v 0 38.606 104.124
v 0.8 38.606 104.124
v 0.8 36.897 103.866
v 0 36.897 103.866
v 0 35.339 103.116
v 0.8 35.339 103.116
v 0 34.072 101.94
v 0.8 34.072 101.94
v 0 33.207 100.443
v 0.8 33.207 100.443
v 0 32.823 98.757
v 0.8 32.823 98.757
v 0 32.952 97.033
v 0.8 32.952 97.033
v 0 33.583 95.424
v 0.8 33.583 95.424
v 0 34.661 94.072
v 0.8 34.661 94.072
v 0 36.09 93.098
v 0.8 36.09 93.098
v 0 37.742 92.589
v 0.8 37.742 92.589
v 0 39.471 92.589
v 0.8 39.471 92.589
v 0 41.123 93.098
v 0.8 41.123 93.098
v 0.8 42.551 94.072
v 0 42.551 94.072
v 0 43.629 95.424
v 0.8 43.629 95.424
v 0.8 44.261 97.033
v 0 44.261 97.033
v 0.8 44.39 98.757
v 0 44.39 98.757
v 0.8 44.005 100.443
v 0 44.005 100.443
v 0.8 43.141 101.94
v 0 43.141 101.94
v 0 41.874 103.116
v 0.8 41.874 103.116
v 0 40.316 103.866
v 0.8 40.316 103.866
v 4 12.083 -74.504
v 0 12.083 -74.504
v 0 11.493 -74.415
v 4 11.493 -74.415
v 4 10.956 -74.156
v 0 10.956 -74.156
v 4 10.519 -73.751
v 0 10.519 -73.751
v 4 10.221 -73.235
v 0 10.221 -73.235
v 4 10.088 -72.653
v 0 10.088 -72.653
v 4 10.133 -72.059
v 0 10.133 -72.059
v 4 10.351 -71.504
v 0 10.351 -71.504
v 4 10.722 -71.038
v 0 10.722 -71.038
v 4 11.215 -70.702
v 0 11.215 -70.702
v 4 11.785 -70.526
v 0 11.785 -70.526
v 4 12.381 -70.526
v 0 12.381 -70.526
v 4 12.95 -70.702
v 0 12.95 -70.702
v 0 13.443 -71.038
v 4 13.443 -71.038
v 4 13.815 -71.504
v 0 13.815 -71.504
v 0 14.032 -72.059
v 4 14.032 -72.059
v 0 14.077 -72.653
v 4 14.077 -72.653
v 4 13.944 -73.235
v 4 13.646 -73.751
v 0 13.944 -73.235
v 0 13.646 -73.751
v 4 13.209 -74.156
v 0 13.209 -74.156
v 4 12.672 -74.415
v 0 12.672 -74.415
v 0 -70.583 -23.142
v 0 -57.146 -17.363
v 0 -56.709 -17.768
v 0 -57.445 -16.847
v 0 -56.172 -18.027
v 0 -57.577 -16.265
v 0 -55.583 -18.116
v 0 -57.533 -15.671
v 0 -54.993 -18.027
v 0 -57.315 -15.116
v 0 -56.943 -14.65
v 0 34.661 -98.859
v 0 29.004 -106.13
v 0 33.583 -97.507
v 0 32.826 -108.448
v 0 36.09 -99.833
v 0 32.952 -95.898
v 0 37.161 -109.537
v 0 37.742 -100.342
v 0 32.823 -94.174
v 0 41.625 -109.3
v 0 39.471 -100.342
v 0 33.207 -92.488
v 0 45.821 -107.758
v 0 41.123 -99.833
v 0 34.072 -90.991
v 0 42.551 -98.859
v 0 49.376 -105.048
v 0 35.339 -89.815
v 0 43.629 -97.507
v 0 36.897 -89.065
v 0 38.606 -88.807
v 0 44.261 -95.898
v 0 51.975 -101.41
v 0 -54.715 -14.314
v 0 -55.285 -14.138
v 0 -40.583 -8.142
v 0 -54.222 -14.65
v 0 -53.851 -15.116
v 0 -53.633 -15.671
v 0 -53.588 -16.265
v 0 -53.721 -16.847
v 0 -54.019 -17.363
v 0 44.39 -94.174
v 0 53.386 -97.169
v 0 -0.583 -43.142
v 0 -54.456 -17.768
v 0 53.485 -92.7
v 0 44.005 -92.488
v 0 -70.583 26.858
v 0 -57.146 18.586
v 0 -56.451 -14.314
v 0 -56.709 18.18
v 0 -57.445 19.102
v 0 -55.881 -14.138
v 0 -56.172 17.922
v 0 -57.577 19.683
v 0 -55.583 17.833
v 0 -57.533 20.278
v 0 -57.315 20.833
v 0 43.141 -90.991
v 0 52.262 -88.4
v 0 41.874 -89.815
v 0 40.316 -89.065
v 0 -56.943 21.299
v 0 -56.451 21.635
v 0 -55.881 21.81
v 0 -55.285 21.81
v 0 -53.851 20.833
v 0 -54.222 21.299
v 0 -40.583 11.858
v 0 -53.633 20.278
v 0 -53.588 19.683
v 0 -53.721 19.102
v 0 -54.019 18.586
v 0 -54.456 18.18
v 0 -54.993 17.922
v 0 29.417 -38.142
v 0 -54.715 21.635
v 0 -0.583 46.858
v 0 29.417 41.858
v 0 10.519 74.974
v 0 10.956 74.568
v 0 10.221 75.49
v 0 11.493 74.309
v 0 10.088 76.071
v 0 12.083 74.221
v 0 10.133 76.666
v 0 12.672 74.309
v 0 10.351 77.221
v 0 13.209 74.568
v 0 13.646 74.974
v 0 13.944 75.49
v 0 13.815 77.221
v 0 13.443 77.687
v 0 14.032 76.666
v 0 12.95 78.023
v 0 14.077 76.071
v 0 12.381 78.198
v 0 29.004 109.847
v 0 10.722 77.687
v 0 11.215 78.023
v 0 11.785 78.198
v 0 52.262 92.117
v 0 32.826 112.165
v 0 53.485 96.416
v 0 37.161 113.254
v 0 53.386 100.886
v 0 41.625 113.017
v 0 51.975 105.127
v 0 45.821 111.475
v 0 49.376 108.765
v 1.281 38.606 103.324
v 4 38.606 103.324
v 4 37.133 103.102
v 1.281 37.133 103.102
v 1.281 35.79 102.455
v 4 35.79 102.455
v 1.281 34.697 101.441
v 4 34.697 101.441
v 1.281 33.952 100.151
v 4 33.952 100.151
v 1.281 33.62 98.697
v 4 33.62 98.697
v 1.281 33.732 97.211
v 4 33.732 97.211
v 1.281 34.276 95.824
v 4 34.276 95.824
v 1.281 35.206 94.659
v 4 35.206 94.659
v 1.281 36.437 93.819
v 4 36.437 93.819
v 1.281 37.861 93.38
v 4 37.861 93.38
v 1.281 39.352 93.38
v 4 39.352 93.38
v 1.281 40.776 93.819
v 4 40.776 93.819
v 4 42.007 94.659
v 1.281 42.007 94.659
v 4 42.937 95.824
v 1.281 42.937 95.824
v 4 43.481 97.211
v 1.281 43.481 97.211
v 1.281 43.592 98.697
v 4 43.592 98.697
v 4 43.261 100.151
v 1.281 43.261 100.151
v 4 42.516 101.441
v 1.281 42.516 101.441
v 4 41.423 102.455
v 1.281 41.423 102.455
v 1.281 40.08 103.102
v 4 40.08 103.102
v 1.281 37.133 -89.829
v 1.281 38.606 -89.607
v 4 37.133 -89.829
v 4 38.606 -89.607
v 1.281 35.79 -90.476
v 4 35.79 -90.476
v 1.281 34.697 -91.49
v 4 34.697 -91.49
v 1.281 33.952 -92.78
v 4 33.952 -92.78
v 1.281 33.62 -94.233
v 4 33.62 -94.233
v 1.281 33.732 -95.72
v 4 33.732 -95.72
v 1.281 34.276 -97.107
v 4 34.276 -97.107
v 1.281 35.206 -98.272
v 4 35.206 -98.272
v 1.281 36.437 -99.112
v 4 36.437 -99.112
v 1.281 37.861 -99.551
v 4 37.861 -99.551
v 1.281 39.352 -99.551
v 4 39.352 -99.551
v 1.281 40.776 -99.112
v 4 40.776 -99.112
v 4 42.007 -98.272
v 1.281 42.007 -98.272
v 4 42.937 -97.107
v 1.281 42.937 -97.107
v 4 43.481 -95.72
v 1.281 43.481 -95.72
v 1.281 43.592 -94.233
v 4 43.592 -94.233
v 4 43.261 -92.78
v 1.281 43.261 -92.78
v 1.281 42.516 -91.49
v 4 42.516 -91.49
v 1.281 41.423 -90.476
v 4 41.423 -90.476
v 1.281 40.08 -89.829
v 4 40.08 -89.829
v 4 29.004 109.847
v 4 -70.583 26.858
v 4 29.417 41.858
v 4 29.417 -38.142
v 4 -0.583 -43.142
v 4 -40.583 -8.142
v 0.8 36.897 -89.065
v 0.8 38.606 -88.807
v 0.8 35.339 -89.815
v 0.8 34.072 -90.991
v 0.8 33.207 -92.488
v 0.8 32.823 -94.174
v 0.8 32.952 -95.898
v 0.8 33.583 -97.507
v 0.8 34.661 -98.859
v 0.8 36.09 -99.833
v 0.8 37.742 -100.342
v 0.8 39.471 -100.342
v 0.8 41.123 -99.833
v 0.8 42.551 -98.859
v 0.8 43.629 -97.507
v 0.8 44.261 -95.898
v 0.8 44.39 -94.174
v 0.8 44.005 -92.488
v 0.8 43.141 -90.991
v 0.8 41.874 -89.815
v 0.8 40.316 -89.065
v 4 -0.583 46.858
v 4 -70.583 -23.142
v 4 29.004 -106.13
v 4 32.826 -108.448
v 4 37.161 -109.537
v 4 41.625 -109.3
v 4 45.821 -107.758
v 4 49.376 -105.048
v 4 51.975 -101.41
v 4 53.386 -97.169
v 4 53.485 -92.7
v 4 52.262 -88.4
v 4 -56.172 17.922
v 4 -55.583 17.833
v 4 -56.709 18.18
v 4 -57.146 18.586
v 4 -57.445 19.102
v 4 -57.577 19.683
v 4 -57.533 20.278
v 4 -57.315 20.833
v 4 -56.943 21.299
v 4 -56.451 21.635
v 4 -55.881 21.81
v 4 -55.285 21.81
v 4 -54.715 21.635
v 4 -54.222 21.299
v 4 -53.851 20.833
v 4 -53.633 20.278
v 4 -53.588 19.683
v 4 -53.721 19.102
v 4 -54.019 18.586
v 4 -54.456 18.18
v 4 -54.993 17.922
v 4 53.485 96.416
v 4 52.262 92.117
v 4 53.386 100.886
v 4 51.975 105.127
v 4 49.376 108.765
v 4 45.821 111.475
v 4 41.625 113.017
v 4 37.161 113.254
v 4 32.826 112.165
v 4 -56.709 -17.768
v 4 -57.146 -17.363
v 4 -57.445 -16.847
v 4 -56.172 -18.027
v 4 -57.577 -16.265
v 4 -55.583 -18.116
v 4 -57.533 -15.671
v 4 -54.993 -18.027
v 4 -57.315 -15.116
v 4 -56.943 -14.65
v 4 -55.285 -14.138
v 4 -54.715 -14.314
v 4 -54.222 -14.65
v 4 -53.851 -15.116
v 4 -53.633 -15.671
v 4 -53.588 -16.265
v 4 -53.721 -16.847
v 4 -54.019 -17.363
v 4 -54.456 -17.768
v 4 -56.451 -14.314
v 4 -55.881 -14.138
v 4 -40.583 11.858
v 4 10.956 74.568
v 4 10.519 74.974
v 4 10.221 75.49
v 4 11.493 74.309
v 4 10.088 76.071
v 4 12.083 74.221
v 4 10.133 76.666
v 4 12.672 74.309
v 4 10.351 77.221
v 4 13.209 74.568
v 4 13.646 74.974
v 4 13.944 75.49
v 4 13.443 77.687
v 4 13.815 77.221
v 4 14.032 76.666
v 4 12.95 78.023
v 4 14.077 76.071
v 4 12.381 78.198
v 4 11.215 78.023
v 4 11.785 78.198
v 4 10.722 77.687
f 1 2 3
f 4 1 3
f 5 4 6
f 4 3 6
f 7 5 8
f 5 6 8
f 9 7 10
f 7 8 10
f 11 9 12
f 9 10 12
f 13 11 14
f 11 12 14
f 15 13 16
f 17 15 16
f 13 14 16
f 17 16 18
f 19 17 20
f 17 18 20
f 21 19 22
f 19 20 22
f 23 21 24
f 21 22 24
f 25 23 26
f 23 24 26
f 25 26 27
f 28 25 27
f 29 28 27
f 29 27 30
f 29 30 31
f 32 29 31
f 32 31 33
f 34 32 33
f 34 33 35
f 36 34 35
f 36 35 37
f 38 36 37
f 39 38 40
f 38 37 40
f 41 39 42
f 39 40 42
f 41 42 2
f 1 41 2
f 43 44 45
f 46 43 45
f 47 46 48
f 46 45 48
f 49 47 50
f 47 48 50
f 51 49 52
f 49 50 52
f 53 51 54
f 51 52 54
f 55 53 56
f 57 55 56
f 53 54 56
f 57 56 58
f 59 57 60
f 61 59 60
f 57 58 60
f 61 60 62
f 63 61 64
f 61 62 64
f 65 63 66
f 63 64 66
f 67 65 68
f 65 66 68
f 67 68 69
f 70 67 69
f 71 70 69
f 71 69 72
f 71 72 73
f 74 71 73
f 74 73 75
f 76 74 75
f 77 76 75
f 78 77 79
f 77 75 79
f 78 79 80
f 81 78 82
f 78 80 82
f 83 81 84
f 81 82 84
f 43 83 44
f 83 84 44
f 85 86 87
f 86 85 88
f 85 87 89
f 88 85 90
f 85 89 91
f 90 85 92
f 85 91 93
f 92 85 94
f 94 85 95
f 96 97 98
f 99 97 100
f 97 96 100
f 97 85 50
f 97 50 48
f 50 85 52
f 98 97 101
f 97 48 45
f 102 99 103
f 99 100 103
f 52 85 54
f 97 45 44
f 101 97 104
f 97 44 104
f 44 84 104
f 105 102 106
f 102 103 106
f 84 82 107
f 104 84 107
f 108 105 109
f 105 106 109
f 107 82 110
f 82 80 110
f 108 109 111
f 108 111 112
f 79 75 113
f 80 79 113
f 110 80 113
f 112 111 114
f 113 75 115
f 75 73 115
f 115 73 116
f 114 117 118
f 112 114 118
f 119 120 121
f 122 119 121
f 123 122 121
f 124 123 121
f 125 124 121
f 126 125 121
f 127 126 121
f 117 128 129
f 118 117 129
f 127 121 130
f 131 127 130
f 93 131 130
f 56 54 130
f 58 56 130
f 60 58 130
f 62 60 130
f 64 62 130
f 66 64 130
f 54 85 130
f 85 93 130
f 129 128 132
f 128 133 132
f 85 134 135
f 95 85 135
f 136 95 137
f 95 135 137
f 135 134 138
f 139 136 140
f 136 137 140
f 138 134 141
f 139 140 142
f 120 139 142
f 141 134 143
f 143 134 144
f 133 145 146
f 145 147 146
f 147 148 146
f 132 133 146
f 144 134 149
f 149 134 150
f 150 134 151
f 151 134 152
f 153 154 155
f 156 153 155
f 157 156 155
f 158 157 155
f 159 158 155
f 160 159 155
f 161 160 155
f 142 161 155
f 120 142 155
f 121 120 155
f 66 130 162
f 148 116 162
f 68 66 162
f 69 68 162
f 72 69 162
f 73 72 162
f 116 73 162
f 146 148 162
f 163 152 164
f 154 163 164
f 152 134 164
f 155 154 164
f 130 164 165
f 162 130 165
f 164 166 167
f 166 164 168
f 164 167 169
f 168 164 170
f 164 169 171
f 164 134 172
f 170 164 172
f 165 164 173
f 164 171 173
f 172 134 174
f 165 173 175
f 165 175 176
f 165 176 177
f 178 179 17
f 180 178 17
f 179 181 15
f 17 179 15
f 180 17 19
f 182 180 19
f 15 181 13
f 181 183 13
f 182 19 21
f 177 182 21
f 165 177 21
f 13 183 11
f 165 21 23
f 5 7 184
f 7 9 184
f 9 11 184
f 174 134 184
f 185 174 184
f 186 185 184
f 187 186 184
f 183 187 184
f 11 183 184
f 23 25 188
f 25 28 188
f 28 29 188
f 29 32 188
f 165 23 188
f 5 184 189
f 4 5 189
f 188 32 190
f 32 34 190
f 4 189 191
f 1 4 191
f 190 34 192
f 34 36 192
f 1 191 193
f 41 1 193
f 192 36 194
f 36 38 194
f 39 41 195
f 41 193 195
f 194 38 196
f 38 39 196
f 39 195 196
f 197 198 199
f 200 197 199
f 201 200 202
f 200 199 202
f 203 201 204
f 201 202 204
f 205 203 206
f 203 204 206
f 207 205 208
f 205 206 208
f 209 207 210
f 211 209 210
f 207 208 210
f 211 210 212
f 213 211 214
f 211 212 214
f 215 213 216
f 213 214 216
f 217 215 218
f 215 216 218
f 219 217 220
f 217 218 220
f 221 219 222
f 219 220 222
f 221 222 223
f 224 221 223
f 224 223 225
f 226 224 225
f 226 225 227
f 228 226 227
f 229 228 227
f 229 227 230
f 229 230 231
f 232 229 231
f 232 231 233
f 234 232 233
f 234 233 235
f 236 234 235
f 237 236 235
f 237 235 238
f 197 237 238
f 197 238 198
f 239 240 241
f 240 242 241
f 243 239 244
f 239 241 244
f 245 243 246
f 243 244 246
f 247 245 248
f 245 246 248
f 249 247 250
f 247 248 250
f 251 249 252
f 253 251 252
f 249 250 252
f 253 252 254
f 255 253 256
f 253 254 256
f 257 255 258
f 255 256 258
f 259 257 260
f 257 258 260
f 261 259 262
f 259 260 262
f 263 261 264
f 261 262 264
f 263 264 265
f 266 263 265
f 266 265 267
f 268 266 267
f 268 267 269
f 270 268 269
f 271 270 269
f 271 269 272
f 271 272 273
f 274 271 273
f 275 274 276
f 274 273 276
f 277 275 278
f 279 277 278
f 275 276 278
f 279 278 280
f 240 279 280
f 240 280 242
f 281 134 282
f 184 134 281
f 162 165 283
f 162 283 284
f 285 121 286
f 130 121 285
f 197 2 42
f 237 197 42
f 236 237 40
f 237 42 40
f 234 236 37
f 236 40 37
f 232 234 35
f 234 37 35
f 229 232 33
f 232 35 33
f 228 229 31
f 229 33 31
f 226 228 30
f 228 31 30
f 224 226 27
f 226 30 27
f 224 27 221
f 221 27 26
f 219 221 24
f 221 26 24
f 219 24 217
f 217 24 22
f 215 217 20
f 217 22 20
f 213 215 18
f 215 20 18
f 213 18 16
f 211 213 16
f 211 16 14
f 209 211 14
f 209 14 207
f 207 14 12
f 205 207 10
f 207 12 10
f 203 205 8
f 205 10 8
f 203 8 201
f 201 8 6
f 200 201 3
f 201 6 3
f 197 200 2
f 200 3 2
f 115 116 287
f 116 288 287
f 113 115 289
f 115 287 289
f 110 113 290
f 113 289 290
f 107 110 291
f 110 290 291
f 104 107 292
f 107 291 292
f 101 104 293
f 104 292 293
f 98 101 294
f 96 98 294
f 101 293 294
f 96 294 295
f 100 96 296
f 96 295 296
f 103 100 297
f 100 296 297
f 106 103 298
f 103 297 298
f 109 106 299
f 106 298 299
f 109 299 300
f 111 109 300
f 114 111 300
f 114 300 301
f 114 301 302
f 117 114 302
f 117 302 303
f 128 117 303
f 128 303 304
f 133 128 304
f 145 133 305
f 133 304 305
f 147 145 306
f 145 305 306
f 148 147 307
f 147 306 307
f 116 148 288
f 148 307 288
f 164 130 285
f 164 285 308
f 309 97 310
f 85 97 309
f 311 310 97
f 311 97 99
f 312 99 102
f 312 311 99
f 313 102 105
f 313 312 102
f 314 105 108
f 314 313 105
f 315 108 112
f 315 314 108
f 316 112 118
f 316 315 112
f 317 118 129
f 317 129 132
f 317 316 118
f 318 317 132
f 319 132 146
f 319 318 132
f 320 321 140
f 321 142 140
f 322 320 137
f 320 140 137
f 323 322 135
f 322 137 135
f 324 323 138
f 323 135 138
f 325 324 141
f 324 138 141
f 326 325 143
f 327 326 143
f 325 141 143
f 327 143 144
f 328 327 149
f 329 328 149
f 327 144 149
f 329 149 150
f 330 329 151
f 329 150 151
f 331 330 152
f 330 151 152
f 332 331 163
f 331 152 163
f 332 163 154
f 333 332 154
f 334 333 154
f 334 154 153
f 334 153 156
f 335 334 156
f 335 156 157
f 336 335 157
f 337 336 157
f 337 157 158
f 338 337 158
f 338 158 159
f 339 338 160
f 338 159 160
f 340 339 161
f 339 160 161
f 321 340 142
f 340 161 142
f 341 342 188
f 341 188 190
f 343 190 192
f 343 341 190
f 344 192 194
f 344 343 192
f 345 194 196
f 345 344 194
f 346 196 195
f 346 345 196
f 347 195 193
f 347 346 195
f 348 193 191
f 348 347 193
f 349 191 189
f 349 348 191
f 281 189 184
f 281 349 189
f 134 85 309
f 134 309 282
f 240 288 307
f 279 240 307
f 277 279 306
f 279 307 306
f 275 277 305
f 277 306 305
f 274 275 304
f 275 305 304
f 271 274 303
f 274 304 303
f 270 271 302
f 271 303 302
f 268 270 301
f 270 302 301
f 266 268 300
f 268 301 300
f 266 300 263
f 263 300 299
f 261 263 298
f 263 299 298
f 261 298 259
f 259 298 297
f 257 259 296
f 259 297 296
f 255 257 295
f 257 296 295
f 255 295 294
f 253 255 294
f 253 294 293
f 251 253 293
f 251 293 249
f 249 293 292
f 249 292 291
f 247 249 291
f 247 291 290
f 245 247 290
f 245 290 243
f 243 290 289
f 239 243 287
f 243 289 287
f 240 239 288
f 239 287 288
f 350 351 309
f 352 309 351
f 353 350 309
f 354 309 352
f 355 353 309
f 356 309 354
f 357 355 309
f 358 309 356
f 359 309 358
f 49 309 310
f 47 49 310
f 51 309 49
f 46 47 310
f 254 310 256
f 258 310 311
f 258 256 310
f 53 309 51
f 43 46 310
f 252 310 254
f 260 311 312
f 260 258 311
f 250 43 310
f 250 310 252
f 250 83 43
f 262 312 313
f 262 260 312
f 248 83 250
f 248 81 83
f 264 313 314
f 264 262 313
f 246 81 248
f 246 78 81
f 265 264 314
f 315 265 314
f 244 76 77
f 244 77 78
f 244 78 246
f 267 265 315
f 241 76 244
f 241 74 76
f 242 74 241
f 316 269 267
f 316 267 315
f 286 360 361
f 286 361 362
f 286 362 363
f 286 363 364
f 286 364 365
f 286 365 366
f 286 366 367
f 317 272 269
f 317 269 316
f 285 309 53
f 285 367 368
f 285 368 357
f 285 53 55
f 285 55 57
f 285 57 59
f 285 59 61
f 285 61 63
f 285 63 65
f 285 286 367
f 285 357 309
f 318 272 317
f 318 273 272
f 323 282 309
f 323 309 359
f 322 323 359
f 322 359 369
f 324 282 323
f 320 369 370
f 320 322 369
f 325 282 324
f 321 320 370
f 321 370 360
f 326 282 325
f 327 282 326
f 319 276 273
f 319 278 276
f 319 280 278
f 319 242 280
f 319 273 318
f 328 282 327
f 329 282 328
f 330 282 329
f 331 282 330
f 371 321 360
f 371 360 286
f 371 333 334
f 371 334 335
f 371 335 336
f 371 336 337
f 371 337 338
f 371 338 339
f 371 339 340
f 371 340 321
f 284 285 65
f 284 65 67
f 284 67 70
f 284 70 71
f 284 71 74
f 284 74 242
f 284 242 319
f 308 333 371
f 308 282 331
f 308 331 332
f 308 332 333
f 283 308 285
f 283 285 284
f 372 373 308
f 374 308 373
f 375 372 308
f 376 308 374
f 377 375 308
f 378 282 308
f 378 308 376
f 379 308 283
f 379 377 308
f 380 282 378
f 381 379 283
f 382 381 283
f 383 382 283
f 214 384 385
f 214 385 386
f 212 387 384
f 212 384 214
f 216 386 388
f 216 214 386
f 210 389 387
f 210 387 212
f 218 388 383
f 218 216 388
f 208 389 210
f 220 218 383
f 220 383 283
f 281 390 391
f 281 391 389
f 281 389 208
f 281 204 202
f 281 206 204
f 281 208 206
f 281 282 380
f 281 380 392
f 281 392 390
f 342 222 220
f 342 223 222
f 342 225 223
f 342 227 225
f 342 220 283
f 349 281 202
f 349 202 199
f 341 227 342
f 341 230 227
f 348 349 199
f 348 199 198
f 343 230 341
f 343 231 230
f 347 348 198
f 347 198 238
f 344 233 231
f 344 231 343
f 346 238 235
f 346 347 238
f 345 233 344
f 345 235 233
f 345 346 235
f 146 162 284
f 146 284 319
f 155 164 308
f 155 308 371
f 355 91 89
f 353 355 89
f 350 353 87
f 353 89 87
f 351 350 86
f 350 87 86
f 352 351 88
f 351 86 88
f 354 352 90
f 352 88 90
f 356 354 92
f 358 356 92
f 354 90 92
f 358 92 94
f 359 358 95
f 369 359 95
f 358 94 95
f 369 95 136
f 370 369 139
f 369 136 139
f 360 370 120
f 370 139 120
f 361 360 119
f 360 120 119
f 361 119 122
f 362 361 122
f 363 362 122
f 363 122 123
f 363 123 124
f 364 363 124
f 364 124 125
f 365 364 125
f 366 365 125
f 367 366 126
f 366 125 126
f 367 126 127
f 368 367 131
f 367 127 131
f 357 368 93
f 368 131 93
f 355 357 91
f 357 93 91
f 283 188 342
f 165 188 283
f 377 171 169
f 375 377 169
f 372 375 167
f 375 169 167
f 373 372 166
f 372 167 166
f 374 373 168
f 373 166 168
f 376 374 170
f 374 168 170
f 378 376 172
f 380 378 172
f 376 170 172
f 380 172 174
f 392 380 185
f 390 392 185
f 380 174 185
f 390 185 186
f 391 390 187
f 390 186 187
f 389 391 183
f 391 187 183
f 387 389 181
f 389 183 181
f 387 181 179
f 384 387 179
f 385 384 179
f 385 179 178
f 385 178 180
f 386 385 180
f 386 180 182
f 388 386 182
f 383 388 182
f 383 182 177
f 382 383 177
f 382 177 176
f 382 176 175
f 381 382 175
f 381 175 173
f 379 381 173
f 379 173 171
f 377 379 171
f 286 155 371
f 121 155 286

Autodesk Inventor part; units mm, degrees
ref_plane "YZ Plane" through (0, 0, 0) normal (1, 0, 0) x (0, 1, 0)
ref_plane "XZ Plane" through (0, 0, 0) normal (0, 1, 0) x (-1, 0, 0)
ref_plane "XY Plane" through (0, 0, 0) normal (0, 0, 1) x (1, 0, 0)
sketch "Sketch1" plane through (0, 0, 0) normal (1, 0, 0) x (0, 1, 0)
  line L0 (79.4172, -148.1416) -> (-70.5828, -23.1416)
  line L1 (-70.5828, -23.1416) -> (-70.5828, 26.8584)
  line L2 (-70.5828, 26.8584) -> (79.4172, 151.8584)
  line L3 (79.4172, 151.8584) -> (29.4172, 41.8584)
  line L4 (29.4172, 41.8584) -> (29.4172, -38.1416)
  line L5 (29.4172, -38.1416) -> (79.4172, -148.1416)
  line L6 (-0.5828, -43.1416) -> (-0.5828, 46.8584)
  line L7 (-0.5828, 46.8584) -> (-40.5828, 11.8584)
  line L8 (-40.5828, 11.8584) -> (-40.5828, -8.1416)
  line L9 (-40.5828, -8.1416) -> (-0.5828, -43.1416)
  point P0 (0, 0)
  dimension "d0" = 0
  dimension "d2" = 50
  dimension "d6" = 150
  dimension "d7" = 300
  dimension "d9" = 80
  dimension "d104" = 50
  dimension "d105" = 15
  dimension "d106" = 20
  dimension "d107" = 40
  dimension "d108" = 30
  dimension "d109" = 90
extrude "Extrusion2" add sketch "Sketch1" along normal blind 4
fillet "Fillet2" radius 15 2 edges at (2, 79.4172, -148.1416) (2, 79.4172, 151.8584)
hole "Hole11" at (0, 38.6064, -94.607) direction (1, 0, 0) diameter 10 end through all
hole "Hole12" at (0, 38.6064, 98.3238) direction (1, 0, 0) diameter 10 end through all
hole "Hole13" at (0, 38.6064, -94.607) direction (1, 0, 0) diameter 11.6 depth 0.8 tip angle 118
hole "Hole14" at (0, 38.6064, 98.3238) direction (1, 0, 0) diameter 11.6 depth 0.8 tip angle 118
hole "Hole15" at (4, 12.0826, 76.2206) direction (-1, 0, 0) diameter 4 depth 8
hole "Hole16" at (4, 12.0826, -72.5039) direction (-1, 0, 0) diameter 4 depth 8
hole "Hole17" at (4, -55.5828, -16.116) direction (-1, 0, 0) diameter 4 depth 8
hole "Hole18" at (4, -55.5828, 19.8328) direction (-1, 0, 0) diameter 4 depth 8
properties part number "BaseCenterPlate"
